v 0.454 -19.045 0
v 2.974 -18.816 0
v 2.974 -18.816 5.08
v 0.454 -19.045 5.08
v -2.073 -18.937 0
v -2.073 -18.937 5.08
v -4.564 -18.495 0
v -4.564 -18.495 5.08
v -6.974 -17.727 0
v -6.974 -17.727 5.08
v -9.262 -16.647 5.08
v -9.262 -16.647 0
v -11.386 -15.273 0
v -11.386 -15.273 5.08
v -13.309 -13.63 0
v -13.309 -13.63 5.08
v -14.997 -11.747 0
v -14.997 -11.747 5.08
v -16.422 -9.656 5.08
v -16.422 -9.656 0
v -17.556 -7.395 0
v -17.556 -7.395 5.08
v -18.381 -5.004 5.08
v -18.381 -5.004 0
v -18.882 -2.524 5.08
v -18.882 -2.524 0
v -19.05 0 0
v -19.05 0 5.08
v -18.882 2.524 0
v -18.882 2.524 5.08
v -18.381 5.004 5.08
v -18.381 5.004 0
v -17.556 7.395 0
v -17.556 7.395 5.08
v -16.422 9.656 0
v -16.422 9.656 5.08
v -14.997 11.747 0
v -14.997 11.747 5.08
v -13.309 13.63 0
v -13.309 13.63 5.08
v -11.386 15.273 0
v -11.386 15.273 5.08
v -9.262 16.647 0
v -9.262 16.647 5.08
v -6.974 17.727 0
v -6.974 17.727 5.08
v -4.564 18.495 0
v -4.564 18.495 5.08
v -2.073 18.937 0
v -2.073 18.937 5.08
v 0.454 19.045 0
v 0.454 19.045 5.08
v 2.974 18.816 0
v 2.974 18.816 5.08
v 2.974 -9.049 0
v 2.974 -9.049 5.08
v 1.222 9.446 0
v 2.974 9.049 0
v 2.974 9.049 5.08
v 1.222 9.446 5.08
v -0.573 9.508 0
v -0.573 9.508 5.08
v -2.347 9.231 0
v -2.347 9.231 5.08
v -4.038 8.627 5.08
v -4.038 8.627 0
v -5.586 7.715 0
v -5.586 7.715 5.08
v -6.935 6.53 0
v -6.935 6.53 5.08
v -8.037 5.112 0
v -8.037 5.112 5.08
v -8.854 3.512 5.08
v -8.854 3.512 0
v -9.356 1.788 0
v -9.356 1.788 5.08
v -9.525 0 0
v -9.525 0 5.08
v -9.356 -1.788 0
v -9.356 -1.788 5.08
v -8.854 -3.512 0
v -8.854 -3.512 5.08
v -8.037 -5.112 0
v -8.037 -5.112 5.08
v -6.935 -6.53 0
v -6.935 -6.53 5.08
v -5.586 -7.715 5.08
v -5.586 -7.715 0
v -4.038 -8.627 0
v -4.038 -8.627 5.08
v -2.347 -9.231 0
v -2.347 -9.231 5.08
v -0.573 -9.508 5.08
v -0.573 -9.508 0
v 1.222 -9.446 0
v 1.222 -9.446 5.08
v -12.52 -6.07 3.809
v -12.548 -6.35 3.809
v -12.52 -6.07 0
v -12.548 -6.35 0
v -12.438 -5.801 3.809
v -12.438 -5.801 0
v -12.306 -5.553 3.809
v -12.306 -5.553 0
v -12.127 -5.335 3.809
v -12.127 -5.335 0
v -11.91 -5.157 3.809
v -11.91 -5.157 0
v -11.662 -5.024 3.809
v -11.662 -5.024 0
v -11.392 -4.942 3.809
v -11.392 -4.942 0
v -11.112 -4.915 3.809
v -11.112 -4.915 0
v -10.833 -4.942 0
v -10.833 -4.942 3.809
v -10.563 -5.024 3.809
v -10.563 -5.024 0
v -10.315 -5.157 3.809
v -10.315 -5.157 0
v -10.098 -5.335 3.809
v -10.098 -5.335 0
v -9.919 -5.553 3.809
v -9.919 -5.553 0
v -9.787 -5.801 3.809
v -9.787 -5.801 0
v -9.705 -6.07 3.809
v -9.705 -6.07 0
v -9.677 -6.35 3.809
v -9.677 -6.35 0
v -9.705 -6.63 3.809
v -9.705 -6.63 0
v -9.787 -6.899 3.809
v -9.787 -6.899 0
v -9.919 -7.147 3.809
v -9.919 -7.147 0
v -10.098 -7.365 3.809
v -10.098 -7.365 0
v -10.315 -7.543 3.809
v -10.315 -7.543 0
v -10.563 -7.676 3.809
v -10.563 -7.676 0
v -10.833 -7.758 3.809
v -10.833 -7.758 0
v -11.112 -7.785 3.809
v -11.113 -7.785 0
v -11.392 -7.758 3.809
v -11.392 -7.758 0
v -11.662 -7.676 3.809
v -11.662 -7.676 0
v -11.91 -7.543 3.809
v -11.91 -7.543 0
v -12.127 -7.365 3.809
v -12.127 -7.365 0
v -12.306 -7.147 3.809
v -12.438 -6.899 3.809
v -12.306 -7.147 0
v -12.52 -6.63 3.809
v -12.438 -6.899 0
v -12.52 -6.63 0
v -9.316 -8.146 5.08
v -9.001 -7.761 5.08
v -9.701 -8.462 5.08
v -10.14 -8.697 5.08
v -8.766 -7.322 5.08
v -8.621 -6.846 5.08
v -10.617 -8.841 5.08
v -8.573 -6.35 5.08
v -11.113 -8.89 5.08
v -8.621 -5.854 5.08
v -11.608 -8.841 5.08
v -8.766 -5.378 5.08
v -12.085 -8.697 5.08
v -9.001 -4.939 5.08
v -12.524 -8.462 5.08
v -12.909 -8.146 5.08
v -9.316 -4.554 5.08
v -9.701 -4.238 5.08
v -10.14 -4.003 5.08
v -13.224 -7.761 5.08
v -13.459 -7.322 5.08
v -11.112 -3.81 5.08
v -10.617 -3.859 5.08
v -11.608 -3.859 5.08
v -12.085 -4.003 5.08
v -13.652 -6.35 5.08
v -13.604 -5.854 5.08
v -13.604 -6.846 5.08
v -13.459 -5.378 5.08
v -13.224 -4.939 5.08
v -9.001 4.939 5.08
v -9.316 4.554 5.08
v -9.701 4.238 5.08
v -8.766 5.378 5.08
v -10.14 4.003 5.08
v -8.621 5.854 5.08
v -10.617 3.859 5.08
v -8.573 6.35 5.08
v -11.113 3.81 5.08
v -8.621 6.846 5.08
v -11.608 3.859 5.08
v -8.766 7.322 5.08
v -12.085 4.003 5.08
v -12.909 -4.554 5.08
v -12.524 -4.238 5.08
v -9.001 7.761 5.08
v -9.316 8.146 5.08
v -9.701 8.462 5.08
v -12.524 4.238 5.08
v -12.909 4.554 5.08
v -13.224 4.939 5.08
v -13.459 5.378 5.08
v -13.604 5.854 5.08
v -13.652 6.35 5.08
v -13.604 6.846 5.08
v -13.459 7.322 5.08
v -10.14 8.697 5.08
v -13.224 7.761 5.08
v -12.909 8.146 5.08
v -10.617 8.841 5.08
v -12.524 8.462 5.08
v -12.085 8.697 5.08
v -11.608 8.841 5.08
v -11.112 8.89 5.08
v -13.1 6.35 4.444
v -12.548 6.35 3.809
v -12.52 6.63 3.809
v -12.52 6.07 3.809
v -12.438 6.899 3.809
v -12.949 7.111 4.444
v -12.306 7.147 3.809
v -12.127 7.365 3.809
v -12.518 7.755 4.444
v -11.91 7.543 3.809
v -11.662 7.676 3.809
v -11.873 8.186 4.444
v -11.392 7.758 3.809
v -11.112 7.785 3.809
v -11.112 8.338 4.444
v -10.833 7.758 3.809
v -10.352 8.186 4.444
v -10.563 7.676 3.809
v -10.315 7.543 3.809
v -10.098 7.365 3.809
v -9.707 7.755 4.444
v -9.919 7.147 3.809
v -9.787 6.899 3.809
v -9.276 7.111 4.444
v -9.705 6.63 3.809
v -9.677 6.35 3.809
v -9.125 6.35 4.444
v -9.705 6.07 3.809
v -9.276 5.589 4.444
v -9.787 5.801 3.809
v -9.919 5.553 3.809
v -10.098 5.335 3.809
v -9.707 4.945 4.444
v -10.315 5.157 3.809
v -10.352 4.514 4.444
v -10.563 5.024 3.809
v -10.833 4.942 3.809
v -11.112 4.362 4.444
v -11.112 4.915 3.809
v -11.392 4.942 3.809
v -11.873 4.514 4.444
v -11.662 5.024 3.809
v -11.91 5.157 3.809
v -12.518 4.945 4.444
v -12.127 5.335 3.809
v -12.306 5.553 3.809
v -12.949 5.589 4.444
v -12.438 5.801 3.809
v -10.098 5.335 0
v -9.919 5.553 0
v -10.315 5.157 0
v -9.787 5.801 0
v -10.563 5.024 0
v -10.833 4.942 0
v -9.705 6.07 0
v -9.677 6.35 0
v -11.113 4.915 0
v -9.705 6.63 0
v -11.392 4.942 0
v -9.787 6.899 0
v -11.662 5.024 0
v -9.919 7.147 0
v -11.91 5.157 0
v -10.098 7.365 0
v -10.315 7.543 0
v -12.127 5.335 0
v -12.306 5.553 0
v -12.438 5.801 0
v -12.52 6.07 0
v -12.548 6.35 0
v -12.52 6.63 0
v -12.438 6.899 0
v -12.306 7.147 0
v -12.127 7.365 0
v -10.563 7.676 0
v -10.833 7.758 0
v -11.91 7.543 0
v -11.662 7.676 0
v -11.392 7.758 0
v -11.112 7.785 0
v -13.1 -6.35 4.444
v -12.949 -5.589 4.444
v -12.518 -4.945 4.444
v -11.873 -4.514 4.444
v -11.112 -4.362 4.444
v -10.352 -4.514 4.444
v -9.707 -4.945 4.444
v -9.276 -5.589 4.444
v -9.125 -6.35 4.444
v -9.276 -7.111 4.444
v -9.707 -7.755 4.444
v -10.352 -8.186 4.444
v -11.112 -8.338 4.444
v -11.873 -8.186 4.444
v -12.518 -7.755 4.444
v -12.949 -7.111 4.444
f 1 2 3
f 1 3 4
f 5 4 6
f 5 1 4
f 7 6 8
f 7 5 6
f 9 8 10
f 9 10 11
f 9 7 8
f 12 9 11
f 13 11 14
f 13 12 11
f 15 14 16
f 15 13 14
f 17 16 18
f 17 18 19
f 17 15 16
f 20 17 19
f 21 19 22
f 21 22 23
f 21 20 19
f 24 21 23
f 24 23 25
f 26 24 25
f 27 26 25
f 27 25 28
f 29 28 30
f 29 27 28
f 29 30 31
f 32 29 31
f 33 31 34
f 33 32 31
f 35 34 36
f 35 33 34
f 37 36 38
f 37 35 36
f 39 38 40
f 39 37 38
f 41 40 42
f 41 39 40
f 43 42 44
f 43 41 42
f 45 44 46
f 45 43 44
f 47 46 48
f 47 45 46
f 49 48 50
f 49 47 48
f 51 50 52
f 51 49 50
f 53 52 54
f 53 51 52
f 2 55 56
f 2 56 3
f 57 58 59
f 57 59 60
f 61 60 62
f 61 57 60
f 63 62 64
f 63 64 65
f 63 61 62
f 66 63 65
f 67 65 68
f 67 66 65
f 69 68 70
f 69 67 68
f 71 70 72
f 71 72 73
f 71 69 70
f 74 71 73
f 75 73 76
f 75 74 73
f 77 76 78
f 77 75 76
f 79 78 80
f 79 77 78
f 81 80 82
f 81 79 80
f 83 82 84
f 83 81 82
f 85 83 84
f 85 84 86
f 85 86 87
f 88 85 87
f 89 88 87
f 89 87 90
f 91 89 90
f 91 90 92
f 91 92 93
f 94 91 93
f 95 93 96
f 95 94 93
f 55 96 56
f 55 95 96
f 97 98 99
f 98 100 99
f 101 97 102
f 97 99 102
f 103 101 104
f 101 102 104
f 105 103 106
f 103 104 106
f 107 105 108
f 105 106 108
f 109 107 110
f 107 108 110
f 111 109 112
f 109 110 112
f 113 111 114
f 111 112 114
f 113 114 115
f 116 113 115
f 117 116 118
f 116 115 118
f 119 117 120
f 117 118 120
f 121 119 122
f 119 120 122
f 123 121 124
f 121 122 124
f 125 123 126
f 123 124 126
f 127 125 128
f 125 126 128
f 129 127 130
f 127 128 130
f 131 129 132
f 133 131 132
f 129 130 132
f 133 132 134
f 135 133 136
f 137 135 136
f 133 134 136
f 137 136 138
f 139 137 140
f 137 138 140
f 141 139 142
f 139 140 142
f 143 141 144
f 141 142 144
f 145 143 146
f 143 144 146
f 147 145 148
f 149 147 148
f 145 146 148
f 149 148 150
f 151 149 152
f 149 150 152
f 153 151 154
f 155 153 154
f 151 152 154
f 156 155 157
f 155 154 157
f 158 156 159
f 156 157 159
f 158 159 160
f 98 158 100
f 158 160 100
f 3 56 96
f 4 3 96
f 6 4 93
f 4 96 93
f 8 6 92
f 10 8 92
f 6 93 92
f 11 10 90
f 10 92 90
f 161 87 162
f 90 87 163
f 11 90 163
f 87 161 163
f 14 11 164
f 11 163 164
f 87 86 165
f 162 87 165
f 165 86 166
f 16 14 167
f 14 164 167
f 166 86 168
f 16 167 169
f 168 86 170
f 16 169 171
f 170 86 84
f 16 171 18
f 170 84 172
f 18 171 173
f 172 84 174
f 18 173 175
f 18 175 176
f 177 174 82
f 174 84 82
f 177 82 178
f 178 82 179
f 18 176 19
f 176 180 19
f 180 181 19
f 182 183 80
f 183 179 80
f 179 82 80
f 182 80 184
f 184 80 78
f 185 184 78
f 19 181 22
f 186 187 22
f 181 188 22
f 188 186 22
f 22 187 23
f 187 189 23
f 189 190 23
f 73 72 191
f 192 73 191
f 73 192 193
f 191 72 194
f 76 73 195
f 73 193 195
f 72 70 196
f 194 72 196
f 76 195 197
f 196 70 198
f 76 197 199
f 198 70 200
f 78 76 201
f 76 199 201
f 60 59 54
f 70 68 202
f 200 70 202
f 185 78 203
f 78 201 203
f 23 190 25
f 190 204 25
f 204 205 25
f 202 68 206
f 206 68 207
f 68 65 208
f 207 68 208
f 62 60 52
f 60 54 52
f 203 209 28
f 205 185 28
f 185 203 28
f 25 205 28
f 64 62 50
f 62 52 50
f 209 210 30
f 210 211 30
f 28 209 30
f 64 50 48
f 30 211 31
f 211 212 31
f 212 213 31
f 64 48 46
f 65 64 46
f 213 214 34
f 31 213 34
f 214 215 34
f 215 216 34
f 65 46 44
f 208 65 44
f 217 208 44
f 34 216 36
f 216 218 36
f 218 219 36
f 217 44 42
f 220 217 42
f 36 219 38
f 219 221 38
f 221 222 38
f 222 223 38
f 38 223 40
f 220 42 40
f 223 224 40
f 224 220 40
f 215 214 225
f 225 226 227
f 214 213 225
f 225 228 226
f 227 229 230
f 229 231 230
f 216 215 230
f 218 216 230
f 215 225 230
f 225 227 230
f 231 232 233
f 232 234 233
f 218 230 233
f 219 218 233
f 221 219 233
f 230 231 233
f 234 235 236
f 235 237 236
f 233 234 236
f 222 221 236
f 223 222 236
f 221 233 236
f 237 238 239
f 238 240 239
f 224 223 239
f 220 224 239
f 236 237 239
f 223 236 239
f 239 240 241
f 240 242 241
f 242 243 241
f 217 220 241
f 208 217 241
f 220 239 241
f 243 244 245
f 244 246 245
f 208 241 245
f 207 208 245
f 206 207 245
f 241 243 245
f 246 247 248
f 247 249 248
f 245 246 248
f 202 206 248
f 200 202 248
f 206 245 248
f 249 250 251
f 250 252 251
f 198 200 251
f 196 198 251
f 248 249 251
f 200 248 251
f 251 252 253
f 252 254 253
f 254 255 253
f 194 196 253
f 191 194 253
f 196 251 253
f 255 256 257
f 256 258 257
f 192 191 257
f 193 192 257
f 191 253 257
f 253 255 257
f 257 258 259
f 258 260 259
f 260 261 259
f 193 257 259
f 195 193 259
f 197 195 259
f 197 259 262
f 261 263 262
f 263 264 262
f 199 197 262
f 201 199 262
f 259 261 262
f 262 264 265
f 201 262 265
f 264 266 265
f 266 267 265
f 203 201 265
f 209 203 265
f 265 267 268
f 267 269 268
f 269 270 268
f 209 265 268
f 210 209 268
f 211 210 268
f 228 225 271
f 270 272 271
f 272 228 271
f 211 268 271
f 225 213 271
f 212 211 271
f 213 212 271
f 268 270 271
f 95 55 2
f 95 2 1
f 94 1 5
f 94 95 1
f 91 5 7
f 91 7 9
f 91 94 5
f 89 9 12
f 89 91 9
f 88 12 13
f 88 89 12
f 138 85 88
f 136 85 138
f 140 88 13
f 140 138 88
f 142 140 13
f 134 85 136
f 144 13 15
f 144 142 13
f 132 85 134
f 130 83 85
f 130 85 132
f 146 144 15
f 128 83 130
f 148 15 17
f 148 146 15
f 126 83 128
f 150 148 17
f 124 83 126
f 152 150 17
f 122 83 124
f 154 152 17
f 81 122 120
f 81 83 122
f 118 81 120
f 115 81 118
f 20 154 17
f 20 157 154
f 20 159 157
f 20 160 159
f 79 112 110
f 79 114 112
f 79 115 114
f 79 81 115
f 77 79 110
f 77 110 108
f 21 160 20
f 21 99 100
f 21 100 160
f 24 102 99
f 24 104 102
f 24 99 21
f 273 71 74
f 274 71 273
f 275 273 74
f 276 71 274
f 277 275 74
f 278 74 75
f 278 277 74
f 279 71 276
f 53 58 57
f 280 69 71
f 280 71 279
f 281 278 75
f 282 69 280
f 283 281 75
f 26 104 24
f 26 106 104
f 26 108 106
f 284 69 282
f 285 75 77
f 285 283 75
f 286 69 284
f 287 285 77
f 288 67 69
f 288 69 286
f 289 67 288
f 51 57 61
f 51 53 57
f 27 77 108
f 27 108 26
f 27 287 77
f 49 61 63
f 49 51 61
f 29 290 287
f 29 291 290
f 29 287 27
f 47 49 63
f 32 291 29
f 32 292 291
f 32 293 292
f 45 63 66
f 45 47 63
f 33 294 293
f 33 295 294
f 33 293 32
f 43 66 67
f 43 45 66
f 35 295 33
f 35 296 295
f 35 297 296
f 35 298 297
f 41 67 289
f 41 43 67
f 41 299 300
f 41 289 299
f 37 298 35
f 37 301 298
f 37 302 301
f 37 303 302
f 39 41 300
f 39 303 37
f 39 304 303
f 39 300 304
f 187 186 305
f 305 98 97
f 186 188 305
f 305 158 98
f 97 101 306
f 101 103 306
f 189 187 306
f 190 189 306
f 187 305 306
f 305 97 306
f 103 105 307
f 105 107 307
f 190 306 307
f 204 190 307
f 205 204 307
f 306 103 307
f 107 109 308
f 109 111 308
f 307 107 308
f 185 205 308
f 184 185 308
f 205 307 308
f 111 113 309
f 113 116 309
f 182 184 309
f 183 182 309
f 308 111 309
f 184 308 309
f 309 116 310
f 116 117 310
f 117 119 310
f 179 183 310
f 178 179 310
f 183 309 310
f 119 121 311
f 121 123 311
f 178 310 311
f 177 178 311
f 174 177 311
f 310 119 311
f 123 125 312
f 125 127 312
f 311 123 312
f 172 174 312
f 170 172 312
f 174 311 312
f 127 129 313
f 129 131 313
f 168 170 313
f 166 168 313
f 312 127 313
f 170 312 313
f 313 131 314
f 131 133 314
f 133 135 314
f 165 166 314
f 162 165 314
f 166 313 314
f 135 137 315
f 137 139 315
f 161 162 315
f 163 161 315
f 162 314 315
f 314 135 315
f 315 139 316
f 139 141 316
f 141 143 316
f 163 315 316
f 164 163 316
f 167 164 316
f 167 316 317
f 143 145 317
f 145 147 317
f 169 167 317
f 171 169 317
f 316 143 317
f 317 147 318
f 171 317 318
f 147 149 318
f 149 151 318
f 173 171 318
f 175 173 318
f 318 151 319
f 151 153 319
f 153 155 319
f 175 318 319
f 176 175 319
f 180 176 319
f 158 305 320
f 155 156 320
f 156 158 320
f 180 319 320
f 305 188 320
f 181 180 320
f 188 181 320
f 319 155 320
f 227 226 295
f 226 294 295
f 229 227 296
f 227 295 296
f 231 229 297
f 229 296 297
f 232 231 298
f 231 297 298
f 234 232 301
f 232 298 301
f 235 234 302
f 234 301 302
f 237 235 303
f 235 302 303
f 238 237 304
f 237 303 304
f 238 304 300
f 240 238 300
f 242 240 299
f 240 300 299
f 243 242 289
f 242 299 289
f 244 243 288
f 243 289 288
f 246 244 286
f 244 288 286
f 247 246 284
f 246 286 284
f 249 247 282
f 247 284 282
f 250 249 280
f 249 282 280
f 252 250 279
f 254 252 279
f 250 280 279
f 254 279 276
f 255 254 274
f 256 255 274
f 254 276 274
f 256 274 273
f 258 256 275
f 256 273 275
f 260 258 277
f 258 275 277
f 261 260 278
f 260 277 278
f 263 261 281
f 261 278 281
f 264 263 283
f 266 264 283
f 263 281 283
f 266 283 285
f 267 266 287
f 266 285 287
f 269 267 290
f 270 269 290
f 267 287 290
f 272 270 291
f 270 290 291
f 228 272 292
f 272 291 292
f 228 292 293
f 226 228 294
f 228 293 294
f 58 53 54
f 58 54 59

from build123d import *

# Parameters (mm, degrees)
BOSS_EXTRUDE1_DEPTH                                = 5.08
CSK_FOR_10_FLAT_HEAD_MACHINE_SCREW_100_D           = 2.8702
CSK_FOR_10_FLAT_HEAD_MACHINE_SCREW_100_CSINK_D     = 5.08
CSK_FOR_10_FLAT_HEAD_MACHINE_SCREW_100_CSINK_ANGLE = 82


with BuildPart() as part:
    # Sketch2 → Boss-Extrude1 (new body)
    with BuildSketch(Plane.XY):
        with BuildLine():
            Line((2.973598589, 18.816487755), (2.973598589, 9.048941177))
            ThreePointArc((2.973598589, 9.048941177), (-9.525, 0), (2.973598589, -9.048941177))
            Line((2.973598589, -9.048941177), (2.973598589, -18.816487755))
            ThreePointArc((2.973598589, -18.816487755), (-19.05, 0), (2.973598589, 18.816487755))
        make_face()
    extrude(amount=BOSS_EXTRUDE1_DEPTH)

    # CSK for #10 Flat Head Machine Screw (100)1 (through all)
    with Locations(Plane(origin=(-11.1125, 6.35, 5.08), x_dir=(1, 0, 0), z_dir=(0, 0, 1))):
        with Locations((0, 0), (0, -12.7)):
            CounterSinkHole(CSK_FOR_10_FLAT_HEAD_MACHINE_SCREW_100_D / 2, CSK_FOR_10_FLAT_HEAD_MACHINE_SCREW_100_CSINK_D / 2, counter_sink_angle=CSK_FOR_10_FLAT_HEAD_MACHINE_SCREW_100_CSINK_ANGLE)


solid = part.part
